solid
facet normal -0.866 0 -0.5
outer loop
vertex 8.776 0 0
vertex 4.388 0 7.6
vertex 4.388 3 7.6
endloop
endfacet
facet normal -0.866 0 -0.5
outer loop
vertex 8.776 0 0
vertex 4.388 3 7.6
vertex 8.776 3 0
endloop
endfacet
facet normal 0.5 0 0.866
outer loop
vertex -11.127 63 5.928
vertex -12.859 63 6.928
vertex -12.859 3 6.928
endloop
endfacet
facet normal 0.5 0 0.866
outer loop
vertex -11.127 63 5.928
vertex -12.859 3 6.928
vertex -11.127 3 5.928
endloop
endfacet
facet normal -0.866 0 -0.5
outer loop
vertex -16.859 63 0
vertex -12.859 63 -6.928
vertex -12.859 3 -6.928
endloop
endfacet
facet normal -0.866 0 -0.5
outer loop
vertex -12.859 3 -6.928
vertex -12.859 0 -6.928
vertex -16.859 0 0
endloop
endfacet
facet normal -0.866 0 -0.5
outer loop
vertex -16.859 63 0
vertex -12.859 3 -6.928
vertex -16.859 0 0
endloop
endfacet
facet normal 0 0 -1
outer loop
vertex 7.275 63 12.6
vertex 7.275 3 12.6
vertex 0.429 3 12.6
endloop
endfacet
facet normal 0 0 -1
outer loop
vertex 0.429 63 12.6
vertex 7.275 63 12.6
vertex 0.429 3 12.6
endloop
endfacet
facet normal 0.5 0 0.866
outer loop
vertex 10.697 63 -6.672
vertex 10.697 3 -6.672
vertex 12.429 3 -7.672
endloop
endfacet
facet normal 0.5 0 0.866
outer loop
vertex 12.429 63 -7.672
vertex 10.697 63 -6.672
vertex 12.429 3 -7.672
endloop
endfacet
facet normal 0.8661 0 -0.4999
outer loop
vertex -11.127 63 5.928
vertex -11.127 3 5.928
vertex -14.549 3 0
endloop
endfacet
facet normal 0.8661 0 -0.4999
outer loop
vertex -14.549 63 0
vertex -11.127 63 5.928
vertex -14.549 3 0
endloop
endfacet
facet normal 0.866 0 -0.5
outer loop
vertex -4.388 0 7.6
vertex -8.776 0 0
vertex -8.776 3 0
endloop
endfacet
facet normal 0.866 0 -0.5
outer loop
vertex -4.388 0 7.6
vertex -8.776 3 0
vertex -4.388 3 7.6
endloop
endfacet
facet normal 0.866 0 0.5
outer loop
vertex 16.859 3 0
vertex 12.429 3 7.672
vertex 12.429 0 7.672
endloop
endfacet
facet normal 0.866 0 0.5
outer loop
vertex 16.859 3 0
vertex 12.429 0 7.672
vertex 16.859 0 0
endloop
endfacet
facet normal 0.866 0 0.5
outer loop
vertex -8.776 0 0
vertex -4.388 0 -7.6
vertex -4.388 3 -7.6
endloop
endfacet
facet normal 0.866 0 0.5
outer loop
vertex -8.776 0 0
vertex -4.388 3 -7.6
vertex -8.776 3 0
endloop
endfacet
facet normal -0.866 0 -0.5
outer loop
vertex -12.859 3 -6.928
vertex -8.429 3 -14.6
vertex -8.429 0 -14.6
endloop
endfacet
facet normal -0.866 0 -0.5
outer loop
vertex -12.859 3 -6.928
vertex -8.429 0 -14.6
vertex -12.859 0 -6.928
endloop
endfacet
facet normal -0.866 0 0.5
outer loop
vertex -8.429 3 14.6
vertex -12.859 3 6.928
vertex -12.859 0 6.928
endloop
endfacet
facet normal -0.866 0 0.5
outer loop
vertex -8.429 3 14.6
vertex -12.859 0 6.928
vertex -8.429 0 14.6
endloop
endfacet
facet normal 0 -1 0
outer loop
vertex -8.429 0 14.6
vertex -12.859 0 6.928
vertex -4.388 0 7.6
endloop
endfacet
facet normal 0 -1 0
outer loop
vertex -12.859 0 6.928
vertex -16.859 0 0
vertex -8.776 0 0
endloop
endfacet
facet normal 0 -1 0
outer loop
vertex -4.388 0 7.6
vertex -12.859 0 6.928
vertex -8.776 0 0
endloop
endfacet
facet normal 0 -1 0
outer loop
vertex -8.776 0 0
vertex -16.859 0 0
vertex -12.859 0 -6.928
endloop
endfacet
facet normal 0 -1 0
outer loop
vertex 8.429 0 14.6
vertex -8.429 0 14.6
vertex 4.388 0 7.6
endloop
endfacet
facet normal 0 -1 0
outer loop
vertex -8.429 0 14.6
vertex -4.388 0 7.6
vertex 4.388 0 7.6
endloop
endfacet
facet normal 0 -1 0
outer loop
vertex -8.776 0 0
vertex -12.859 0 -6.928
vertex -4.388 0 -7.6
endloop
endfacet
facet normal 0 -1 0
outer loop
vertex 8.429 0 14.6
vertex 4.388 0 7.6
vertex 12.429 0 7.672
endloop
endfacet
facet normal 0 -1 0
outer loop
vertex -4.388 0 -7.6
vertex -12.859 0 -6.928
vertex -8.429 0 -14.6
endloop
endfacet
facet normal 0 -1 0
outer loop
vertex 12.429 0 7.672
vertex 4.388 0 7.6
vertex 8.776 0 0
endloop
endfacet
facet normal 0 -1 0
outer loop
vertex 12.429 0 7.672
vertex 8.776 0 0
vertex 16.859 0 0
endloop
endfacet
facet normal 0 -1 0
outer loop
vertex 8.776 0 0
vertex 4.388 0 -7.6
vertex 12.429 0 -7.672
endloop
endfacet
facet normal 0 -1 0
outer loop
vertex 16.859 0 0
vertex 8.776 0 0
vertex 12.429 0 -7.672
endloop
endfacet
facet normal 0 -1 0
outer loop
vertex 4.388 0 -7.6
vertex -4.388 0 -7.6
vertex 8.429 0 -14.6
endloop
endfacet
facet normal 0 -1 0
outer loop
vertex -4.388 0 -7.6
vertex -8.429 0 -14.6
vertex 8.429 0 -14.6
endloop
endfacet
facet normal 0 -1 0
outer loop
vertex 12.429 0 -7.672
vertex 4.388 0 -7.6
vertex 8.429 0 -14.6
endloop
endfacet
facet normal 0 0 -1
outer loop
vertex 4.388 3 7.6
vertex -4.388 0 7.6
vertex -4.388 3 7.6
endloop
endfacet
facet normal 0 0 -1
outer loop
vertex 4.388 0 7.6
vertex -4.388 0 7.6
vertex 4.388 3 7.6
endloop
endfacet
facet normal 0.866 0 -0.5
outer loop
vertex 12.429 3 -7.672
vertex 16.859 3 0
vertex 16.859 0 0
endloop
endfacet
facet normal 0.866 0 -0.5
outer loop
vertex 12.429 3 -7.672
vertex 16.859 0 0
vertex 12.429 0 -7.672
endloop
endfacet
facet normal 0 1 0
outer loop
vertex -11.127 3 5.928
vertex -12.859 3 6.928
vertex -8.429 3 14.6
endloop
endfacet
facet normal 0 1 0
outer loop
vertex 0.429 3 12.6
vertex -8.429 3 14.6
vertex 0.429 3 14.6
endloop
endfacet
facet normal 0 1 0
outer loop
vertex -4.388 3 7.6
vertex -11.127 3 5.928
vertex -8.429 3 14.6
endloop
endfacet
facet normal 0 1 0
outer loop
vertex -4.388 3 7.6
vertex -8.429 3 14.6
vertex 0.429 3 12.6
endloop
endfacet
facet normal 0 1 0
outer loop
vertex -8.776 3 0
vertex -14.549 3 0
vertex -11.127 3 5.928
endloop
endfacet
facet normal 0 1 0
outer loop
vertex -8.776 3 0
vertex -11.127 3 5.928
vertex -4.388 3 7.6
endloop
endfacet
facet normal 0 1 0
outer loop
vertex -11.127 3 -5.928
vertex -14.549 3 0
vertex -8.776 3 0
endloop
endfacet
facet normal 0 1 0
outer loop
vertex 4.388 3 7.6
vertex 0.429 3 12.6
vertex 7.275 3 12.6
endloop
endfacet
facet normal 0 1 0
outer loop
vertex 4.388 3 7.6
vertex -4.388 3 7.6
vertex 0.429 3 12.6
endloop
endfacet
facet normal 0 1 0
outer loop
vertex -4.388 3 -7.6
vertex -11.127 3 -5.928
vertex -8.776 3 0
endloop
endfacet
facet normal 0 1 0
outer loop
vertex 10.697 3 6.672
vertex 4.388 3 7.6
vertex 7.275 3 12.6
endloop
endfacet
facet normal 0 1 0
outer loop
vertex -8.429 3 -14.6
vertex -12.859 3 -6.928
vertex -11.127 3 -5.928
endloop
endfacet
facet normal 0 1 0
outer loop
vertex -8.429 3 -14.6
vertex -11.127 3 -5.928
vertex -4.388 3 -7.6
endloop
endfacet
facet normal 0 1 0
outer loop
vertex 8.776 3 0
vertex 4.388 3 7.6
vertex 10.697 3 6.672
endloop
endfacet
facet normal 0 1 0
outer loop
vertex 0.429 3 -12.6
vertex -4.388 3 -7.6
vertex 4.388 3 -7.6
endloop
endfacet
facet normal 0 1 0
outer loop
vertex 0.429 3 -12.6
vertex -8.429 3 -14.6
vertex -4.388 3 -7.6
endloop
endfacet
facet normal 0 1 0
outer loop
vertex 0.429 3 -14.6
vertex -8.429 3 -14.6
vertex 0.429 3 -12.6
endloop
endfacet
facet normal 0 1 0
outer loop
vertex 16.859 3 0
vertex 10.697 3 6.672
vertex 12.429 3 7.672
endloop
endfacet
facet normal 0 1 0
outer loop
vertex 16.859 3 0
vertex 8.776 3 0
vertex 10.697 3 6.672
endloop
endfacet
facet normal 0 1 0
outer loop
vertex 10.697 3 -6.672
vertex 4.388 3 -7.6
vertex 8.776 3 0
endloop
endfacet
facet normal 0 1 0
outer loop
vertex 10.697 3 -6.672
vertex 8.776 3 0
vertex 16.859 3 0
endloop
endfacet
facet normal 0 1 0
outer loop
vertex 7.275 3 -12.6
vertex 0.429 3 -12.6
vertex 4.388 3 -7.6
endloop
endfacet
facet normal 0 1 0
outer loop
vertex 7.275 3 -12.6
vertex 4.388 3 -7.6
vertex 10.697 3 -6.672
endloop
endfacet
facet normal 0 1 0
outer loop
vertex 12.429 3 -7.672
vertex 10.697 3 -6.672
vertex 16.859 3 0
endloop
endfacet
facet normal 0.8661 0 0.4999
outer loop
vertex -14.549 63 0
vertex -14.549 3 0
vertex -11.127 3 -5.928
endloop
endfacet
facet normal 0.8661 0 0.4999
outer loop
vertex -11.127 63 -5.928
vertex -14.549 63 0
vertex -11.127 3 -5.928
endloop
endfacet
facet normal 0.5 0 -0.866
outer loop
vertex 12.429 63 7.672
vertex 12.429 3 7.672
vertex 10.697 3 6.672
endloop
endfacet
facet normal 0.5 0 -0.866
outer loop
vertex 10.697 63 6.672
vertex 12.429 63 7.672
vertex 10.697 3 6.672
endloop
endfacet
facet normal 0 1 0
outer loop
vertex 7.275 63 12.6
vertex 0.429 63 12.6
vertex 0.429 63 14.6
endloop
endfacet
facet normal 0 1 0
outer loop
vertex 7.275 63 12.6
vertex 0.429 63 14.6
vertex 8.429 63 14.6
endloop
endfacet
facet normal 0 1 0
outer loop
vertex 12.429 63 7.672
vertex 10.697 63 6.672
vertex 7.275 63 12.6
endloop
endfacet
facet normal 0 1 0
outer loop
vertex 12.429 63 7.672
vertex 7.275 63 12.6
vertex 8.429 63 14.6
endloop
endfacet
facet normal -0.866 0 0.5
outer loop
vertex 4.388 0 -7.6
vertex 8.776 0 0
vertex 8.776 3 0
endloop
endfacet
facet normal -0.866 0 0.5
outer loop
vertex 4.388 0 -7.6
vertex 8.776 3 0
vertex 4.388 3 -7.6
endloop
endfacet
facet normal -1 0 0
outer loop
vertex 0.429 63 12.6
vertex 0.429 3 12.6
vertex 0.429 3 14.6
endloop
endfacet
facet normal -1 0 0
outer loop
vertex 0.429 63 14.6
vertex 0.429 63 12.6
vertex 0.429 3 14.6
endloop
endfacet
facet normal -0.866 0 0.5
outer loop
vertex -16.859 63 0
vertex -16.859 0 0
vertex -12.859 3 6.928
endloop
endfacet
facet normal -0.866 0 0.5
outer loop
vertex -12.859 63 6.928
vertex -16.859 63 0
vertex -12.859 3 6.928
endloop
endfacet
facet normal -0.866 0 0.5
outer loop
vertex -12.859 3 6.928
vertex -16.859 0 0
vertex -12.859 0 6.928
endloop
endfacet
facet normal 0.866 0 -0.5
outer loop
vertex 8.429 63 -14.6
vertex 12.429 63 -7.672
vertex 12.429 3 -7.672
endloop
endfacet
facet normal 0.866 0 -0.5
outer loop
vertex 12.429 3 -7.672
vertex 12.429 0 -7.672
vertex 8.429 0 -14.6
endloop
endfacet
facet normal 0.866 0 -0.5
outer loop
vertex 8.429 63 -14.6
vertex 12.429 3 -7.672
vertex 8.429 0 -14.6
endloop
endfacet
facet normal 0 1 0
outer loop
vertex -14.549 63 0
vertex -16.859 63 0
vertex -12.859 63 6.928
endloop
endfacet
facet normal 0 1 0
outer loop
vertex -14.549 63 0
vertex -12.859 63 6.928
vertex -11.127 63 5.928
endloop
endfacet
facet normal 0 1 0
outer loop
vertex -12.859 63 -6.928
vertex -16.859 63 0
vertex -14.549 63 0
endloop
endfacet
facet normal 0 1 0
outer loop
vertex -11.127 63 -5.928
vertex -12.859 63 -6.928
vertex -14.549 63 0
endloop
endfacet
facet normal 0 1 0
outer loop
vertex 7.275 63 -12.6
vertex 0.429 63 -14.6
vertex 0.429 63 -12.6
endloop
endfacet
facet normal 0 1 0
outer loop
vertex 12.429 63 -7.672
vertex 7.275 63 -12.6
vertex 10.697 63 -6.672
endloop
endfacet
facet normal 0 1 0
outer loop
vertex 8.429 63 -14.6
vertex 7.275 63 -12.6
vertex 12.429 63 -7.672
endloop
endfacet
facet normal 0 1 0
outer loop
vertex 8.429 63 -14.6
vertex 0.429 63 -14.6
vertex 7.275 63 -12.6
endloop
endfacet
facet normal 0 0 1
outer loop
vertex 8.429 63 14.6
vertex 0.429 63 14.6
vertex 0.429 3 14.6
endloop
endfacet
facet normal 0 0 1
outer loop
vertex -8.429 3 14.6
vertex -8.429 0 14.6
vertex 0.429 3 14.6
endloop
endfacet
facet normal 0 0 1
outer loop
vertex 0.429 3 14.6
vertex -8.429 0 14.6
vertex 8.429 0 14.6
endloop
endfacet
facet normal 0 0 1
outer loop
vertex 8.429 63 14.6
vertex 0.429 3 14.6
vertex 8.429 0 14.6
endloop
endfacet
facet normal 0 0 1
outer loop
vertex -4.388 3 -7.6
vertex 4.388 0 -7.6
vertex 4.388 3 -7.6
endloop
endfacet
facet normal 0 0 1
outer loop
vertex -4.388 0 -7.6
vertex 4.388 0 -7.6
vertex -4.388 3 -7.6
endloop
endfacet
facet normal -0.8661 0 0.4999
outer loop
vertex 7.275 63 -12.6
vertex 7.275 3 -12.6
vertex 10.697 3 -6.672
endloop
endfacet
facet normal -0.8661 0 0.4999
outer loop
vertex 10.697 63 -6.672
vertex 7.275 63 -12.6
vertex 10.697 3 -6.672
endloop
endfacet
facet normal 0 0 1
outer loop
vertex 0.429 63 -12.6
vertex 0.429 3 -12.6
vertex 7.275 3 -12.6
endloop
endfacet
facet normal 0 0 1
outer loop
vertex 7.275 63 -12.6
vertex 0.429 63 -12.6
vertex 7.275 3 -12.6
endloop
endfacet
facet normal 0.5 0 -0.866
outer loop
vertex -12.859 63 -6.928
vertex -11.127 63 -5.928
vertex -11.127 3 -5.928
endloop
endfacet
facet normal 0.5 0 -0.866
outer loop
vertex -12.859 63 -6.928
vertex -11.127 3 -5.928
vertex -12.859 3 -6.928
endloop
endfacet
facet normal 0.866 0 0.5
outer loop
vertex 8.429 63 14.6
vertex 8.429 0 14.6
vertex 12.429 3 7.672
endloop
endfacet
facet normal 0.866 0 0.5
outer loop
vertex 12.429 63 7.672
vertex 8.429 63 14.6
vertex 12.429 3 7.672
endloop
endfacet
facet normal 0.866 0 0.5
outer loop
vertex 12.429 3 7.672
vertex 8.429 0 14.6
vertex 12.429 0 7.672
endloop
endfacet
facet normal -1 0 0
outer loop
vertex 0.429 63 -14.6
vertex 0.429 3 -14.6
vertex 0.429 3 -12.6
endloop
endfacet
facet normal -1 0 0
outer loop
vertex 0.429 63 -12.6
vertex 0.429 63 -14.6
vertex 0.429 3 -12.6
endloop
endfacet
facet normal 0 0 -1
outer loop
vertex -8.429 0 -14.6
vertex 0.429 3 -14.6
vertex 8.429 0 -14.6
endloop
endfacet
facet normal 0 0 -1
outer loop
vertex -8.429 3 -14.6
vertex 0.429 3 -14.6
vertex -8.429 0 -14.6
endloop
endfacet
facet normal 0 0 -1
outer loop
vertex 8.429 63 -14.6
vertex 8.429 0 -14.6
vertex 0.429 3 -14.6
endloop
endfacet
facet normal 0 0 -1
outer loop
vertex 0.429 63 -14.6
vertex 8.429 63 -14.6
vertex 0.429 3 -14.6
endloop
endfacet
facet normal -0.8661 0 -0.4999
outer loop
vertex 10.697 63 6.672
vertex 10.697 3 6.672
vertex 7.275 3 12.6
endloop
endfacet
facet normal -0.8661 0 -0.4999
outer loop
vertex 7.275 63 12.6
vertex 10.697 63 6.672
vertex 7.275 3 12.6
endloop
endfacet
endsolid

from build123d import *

# Parameters (mm, degrees)
EXTRUDE_1_DEPTH = 3
EXTRUDE_START   = -3
EXTRUDE_2_DEPTH = 63
EXTRUDE_3_DEPTH = 3


with BuildPart() as part:
    # 草图1 → 凸台-拉伸1 (new body)
    with BuildSketch(Plane(origin=(0, 0, 0), x_dir=(1, 0, 0), z_dir=(0, 1, 0))):
        Polygon((14.549226784, 0), (7.274613392, 12.6), (-7.274613392, 12.6), (-14.549226784, 0), (-7.274613392, -12.6), (7.274613392, -12.6), align=None)
        Polygon((-8.775724092, 0), (-4.387862046, -7.6), (4.387862046, -7.6), (8.775724092, 0), (4.387862046, 7.6), (-4.387862046, 7.6), align=None, mode=Mode.SUBTRACT)
    extrude(amount=EXTRUDE_1_DEPTH)

    # 草图2 → 凸台-拉伸2 (add)
    with BuildSketch(Plane(origin=(0, 3, 0), x_dir=(1, 0, 0), z_dir=(0, 1, 0)).offset(EXTRUDE_START)):
        Polygon((-12.85862786, 6.92820323), (-16.85862786, 0), (-12.85862786, -6.92820323), (-11.126577053, -5.92820323), (-14.549226784, 0), (-11.126577053, 5.92820323), align=None)
        Polygon((8.42931393, 14.6), (0.42931393, 14.6), (0.42931393, 12.6), (7.274613392, 12.6), (10.697263123, 6.67179677), (12.42931393, 7.67179677), align=None)
        Polygon((0.42931393, -12.6), (0.42931393, -14.6), (8.42931393, -14.6), (12.42931393, -7.67179677), (10.697263123, -6.67179677), (7.274613392, -12.6), align=None)
    extrude(amount=EXTRUDE_2_DEPTH)

    # 草图2<3> → 凸台-拉伸3 (add)
    with BuildSketch(Plane(origin=(0, 3, 0), x_dir=(1, 0, 0), z_dir=(0, 1, 0))):
        Polygon((-8.42931393, 14.6), (-12.85862786, 6.92820323), (-11.126577053, 5.92820323), (-7.274613392, 12.6), (0.42931393, 12.6), (0.42931393, 14.6), align=None)
        Polygon((10.697263123, -6.67179677), (12.42931393, -7.67179677), (16.85862786, 0), (12.42931393, 7.67179677), (10.697263123, 6.67179677), (14.549226784, 0), align=None)
        Polygon((-11.126577053, -5.92820323), (-12.85862786, -6.92820323), (-8.42931393, -14.6), (0.42931393, -14.6), (0.42931393, -12.6), (-7.274613392, -12.6), align=None)
    extrude(amount=-EXTRUDE_3_DEPTH)


solid = part.part
